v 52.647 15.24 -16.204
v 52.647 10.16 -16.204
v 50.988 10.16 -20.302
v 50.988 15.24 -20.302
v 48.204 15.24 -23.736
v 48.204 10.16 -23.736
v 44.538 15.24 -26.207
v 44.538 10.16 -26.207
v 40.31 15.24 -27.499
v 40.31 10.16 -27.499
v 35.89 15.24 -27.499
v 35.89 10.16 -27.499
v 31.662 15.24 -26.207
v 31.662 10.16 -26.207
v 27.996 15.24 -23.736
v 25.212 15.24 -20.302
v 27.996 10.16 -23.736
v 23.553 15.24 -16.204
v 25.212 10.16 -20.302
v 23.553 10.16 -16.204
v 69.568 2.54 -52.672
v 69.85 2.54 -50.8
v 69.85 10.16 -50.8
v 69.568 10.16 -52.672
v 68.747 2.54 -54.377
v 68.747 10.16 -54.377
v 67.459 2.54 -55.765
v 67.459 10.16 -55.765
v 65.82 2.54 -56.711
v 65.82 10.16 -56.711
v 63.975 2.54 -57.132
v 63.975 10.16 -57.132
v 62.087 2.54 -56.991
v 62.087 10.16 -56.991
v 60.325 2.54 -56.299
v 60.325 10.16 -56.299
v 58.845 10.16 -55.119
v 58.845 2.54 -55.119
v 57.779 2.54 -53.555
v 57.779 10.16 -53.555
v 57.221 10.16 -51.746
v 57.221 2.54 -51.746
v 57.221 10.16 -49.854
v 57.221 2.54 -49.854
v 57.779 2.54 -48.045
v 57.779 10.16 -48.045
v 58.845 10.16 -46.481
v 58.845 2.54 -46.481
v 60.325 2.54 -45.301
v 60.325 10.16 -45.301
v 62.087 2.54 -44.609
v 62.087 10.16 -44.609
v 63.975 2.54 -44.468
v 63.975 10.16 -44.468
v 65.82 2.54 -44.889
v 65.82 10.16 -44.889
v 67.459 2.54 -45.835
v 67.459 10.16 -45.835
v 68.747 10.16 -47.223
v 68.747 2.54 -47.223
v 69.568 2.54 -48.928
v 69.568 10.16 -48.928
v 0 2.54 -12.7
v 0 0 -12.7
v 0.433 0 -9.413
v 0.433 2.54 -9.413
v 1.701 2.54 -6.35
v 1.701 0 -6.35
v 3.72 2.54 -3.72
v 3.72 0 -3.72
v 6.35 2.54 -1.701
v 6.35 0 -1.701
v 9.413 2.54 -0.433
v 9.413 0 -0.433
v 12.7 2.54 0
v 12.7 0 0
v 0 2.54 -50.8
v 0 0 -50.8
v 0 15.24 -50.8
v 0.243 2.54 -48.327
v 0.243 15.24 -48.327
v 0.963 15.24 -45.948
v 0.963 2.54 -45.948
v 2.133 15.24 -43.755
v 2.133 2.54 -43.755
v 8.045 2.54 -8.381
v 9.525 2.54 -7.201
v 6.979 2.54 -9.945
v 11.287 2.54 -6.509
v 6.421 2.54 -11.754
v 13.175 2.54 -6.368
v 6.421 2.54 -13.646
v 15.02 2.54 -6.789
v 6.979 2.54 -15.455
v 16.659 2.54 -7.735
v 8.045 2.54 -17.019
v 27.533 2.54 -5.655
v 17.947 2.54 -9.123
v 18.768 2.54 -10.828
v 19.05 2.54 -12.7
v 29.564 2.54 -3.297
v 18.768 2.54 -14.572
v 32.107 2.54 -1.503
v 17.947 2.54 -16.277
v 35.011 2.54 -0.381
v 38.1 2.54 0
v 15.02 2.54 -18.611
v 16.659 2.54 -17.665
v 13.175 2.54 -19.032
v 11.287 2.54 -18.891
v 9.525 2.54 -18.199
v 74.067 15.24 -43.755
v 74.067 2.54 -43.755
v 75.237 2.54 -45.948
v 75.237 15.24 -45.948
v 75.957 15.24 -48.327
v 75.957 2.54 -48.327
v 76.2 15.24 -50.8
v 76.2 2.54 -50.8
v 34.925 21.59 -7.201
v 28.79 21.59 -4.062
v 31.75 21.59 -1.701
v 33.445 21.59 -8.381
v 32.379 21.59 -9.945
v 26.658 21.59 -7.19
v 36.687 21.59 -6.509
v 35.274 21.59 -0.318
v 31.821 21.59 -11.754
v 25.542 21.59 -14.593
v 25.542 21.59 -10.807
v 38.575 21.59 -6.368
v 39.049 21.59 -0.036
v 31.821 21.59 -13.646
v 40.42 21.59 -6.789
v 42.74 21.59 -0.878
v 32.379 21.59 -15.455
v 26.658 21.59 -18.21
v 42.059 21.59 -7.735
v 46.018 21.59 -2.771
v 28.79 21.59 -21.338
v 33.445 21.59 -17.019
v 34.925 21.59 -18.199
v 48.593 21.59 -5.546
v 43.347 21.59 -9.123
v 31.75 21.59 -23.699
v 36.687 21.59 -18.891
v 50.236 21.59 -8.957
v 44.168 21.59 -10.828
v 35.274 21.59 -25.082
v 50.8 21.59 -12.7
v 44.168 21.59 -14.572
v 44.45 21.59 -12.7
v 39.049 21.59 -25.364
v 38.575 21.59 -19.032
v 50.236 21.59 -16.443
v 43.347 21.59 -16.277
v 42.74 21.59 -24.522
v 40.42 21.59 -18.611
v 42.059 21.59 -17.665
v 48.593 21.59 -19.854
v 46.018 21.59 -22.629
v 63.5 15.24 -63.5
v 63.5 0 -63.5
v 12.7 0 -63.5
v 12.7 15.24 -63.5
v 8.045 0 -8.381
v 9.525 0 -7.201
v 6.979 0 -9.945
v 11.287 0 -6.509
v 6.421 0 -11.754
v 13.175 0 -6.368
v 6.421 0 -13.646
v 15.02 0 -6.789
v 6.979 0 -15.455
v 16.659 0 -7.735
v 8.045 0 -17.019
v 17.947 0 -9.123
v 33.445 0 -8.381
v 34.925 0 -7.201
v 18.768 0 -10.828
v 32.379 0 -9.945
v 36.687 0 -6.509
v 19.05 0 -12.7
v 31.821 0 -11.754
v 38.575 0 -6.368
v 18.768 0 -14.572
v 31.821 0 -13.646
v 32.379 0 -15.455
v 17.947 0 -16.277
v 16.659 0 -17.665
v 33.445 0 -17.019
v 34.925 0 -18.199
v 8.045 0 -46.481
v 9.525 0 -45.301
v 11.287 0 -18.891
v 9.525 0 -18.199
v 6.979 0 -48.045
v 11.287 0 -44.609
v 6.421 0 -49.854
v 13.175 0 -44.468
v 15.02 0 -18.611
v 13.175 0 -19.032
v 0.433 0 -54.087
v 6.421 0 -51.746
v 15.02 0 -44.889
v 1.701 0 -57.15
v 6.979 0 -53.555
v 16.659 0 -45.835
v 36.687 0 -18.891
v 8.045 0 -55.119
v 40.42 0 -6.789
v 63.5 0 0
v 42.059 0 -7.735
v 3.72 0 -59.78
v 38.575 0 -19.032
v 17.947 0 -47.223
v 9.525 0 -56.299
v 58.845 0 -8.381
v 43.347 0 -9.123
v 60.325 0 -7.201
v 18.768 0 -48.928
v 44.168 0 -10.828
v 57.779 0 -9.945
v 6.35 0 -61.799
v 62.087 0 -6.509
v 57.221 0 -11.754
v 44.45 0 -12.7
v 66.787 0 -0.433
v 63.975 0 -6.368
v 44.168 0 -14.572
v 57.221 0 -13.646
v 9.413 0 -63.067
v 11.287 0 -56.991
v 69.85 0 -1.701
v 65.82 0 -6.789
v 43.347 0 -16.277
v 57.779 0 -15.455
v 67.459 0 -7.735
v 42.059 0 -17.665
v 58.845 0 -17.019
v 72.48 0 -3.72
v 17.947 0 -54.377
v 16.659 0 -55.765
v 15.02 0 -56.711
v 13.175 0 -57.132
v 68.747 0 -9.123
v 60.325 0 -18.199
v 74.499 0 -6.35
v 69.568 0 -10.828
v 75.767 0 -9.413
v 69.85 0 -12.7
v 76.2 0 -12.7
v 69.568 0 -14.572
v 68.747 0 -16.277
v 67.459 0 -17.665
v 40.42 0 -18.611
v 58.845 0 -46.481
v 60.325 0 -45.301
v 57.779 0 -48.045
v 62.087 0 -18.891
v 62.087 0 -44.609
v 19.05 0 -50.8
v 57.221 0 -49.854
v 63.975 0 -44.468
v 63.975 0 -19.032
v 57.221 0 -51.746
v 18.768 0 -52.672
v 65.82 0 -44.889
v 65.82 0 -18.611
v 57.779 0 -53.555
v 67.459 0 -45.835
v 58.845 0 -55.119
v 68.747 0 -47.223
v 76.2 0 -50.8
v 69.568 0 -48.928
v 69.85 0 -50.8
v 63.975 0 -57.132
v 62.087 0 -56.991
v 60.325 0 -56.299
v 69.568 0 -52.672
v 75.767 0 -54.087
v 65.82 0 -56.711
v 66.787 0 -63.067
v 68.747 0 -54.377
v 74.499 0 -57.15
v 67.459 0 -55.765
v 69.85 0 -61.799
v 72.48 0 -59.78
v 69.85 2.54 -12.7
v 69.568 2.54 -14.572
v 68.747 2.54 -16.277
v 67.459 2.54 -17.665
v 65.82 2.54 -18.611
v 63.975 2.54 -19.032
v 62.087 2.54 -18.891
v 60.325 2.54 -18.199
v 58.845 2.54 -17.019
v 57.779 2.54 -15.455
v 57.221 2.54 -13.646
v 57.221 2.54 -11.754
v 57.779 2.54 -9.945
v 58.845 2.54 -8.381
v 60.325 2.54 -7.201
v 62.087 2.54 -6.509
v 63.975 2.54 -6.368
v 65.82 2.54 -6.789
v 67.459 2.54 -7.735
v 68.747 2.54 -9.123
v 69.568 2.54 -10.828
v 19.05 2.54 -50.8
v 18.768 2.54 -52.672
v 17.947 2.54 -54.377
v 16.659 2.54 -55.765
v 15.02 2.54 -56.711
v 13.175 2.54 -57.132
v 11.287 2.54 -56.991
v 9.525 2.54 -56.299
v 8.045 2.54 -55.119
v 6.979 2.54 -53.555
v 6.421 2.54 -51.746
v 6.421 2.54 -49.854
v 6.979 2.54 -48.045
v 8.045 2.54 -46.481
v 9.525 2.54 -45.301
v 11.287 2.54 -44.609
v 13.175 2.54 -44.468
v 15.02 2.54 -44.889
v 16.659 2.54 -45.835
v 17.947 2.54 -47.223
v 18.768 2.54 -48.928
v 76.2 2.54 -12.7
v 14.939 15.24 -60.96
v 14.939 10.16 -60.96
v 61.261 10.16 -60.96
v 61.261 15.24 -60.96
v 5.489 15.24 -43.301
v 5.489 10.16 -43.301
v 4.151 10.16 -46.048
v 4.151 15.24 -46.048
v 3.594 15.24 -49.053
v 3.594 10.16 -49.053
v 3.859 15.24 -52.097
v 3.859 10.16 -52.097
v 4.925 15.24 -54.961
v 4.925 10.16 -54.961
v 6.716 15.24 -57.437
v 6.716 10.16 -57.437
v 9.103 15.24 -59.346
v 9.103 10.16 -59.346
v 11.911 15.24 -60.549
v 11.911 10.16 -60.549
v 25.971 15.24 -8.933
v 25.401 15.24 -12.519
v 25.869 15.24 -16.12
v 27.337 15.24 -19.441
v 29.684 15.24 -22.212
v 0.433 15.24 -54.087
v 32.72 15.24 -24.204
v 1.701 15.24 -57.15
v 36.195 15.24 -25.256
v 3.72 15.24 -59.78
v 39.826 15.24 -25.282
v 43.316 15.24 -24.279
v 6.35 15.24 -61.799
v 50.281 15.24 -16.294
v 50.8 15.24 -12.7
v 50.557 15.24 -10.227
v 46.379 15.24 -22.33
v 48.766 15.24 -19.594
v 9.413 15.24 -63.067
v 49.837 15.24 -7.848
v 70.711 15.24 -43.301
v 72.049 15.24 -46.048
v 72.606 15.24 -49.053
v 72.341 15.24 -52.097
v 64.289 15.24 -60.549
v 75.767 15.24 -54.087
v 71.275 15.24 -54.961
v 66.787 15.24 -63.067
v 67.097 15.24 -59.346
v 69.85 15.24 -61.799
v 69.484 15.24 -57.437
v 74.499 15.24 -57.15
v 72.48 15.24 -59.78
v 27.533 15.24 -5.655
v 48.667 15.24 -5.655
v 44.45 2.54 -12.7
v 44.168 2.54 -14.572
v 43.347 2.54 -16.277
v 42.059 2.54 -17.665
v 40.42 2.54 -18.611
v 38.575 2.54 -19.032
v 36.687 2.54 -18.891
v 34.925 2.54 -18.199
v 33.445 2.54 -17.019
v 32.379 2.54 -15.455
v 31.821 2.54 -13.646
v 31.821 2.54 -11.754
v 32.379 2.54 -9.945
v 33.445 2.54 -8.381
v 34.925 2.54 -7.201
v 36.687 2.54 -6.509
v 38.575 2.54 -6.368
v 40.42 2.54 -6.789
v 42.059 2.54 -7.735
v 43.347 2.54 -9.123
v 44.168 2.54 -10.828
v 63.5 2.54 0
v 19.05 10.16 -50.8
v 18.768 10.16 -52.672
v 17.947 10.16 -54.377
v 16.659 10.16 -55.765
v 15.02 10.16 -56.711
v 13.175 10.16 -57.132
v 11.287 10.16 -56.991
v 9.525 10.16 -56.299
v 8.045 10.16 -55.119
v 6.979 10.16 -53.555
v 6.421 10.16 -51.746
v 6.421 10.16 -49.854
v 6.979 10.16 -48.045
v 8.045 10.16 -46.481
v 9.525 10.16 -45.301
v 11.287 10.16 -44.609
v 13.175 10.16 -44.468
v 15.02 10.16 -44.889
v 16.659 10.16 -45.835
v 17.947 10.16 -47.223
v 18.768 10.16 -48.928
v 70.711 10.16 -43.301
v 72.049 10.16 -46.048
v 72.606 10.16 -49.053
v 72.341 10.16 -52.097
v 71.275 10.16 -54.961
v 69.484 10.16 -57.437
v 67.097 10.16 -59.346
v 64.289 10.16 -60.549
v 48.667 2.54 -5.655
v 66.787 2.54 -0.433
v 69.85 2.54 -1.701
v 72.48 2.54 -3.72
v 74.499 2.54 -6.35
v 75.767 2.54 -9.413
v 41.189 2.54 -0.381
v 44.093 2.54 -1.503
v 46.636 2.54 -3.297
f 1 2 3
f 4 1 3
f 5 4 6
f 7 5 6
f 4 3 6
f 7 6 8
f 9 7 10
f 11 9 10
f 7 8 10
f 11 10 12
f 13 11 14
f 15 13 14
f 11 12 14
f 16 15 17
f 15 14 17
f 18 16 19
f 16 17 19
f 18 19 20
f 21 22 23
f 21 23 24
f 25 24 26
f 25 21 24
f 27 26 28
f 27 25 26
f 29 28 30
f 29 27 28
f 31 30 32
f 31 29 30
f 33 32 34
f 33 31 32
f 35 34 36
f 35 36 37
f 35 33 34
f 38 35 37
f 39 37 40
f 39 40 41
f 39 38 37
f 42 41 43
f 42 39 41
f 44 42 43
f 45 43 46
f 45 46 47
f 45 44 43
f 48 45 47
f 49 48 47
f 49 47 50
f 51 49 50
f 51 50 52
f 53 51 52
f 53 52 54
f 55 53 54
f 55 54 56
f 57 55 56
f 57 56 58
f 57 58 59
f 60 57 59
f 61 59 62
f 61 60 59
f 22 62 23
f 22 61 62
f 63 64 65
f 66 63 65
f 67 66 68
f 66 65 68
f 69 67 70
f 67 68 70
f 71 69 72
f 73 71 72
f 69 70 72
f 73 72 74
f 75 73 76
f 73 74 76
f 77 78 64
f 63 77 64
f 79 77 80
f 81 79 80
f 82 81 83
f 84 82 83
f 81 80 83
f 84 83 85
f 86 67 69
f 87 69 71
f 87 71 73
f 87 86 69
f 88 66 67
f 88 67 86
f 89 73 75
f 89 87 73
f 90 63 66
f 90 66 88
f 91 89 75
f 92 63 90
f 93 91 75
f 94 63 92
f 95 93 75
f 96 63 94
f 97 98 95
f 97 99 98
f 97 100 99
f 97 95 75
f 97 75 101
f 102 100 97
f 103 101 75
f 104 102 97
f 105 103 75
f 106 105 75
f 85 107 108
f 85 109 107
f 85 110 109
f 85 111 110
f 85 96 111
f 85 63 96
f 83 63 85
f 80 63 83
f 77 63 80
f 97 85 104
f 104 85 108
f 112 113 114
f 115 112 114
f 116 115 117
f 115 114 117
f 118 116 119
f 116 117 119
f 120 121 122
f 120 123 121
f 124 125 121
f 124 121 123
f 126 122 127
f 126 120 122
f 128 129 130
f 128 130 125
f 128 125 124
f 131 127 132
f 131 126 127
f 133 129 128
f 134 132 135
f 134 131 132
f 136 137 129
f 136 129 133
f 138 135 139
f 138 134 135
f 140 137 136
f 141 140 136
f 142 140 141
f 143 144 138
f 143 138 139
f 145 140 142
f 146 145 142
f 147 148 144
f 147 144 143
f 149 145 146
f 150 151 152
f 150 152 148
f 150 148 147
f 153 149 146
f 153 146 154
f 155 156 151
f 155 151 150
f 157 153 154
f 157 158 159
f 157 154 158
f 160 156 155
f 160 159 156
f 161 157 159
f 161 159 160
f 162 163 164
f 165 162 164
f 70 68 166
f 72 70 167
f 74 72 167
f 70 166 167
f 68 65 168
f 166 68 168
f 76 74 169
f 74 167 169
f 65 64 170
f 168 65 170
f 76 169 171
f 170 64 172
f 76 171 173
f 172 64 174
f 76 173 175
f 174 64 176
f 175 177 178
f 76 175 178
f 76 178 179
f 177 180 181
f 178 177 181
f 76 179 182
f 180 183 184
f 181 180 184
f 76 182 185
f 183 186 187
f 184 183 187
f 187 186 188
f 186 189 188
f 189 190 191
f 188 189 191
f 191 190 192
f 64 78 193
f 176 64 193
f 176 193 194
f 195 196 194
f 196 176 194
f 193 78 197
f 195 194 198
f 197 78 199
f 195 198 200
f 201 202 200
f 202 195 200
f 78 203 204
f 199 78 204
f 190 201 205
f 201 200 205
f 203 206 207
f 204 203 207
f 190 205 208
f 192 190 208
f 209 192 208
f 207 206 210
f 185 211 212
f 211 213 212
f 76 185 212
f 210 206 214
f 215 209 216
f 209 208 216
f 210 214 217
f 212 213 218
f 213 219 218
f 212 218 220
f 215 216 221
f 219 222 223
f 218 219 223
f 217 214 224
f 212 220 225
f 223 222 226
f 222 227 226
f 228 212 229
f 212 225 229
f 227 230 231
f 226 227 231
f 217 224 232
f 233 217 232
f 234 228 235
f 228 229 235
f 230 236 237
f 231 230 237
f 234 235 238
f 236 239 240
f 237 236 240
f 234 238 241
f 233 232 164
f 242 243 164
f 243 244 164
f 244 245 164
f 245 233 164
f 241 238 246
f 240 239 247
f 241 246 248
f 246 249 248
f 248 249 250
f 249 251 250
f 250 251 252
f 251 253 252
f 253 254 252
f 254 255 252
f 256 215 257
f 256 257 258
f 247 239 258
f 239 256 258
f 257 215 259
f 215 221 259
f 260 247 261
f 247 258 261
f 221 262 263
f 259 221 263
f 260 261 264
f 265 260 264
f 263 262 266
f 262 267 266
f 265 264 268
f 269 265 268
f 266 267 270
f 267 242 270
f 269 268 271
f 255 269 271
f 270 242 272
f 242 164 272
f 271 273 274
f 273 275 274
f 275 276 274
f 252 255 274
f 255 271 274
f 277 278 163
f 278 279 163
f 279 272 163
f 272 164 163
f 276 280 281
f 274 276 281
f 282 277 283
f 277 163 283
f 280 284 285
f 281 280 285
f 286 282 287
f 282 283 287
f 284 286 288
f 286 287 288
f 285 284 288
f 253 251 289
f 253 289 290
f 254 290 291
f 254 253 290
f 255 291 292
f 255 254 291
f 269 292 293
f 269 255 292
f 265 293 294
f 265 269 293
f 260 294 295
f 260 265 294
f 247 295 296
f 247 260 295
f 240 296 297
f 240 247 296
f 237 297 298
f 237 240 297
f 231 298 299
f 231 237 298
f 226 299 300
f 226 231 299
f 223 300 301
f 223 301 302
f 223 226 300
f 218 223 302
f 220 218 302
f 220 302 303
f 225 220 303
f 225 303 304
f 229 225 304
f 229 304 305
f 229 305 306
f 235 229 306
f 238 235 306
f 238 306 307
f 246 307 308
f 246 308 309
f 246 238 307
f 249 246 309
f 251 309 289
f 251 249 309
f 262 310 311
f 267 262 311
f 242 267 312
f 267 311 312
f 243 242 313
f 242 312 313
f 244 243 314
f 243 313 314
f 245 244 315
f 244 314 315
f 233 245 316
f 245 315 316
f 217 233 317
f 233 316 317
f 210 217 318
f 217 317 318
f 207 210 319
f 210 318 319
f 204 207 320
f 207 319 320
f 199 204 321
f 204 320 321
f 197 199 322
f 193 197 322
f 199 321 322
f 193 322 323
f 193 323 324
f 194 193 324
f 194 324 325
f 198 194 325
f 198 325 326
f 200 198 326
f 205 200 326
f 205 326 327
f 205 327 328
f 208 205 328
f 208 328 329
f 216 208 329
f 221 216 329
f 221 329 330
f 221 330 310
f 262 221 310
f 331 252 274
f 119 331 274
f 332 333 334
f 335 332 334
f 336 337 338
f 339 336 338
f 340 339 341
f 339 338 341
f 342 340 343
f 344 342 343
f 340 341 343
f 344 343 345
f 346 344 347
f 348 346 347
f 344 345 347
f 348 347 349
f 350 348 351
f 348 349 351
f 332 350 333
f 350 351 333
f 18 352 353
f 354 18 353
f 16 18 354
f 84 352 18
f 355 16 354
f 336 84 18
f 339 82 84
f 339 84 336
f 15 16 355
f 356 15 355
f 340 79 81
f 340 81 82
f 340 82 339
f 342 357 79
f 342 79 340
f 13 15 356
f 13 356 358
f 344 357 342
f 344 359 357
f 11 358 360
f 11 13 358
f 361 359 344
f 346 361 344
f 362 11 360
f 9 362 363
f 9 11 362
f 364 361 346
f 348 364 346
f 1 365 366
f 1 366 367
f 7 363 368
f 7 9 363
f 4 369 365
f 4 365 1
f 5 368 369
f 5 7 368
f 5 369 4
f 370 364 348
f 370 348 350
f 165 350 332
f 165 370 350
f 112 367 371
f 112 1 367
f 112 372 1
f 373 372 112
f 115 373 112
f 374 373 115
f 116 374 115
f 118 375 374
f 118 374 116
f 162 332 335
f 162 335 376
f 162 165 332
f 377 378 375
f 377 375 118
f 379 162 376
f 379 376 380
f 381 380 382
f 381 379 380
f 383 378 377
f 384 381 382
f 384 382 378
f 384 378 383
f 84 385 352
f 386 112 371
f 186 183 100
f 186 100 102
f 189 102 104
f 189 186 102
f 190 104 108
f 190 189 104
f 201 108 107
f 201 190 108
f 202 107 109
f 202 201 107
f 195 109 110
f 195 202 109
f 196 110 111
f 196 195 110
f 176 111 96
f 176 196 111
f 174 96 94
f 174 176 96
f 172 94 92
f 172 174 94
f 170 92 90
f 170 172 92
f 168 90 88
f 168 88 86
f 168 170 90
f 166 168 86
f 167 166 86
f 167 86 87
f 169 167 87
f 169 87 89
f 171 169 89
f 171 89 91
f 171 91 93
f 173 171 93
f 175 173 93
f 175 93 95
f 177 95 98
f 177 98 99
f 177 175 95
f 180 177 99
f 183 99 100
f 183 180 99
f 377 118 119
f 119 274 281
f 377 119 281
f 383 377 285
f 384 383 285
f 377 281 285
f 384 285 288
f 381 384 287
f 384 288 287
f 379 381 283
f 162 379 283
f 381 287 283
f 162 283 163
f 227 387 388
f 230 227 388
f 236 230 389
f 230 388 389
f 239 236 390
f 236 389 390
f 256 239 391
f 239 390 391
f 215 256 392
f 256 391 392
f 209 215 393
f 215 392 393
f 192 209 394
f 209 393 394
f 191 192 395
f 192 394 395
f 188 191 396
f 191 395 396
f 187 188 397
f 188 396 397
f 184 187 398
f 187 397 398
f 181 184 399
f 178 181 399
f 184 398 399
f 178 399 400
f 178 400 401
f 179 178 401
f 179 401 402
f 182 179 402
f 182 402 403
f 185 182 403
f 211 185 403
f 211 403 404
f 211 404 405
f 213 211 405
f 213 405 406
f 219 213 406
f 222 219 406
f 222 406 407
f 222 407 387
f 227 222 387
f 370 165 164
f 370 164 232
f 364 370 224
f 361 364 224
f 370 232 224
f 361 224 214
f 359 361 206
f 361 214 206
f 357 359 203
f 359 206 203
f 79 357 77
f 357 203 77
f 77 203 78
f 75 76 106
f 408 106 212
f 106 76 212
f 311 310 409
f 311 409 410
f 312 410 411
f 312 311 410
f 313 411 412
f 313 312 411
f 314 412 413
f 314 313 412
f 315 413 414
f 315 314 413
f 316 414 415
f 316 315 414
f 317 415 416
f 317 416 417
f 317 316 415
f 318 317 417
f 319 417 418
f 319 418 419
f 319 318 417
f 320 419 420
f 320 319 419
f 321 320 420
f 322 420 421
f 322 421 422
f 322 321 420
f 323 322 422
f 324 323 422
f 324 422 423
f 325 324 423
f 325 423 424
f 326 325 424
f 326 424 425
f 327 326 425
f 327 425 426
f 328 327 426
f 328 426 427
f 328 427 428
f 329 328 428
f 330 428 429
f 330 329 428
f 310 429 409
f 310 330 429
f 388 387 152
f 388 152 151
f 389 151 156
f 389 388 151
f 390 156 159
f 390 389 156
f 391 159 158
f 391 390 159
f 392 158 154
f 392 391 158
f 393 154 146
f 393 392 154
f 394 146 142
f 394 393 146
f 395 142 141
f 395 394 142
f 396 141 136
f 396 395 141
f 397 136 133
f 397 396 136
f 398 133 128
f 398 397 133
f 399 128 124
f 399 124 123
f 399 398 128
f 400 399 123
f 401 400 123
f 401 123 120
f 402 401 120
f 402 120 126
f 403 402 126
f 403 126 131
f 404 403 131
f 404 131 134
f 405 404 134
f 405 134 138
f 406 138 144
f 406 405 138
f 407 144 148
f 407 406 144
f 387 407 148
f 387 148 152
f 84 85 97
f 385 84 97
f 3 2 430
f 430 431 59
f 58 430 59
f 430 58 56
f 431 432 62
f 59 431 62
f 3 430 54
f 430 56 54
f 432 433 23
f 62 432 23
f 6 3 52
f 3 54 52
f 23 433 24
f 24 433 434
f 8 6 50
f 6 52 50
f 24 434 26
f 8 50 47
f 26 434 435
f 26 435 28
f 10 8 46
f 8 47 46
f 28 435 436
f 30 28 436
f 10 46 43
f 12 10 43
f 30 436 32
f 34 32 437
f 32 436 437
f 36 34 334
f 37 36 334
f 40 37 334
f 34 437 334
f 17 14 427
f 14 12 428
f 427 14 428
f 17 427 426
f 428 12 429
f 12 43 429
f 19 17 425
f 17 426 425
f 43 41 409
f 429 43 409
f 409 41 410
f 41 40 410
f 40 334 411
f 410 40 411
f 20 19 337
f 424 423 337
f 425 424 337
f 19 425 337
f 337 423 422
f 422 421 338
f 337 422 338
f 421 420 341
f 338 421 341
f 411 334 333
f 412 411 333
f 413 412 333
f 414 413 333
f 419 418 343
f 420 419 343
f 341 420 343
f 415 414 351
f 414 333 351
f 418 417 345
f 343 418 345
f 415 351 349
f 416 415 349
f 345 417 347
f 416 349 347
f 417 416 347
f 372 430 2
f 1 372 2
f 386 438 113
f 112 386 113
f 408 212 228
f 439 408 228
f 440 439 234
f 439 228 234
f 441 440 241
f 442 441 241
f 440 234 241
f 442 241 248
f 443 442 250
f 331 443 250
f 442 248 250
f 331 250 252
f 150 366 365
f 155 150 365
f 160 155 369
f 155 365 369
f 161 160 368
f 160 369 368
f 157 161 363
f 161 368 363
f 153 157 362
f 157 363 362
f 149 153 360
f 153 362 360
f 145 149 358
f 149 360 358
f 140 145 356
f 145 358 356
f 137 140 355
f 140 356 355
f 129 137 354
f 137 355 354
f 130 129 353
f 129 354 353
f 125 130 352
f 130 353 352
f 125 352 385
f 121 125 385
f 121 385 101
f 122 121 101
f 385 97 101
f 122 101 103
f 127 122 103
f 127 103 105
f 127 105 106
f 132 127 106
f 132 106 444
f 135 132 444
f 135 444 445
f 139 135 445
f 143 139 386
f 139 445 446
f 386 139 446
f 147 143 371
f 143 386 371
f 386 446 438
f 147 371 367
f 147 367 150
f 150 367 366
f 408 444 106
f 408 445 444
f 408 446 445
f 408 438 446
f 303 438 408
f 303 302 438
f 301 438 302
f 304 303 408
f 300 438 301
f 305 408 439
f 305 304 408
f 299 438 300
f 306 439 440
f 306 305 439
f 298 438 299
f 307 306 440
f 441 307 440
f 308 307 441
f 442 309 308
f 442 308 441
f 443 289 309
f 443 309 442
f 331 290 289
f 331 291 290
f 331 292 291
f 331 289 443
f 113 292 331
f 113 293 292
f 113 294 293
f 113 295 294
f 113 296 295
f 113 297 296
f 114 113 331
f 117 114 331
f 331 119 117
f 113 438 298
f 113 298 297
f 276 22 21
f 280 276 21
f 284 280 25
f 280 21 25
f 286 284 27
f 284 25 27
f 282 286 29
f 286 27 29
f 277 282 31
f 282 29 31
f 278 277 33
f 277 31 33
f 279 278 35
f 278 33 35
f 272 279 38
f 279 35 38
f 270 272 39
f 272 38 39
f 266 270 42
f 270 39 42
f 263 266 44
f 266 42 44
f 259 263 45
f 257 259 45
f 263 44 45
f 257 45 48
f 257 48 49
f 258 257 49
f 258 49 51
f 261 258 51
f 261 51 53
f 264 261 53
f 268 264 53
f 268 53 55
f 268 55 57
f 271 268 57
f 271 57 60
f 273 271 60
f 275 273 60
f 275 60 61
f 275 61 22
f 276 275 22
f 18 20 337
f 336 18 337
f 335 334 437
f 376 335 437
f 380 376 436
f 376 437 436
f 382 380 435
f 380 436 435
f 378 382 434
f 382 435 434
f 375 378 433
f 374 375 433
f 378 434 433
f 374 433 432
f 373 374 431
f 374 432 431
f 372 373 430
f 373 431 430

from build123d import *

# Parameters (mm, degrees)
SKETCH1_R           = 6.35
BOSS_EXTRUDE1_DEPTH = 2.54
BOSS_EXTRUDE2_DEPTH = 12.7
SKETCH2_3_R         = 6.35
BOSS_EXTRUDE3_DEPTH = 19.05
SKETCH2_5_R         = 6.35
BOSS_EXTRUDE4_DEPTH = 7.62
CUT_EXTRUDE1_START  = -7.62
SKETCH5_R           = 6.35
CUT_EXTRUDE1_DEPTH  = 7.62


with BuildPart() as part:
    # Sketch1 → Boss-Extrude1 (new body)
    with BuildSketch(Plane(origin=(0, 0, 0), x_dir=(1, 0, 0), z_dir=(0, 1, 0))):
        with BuildLine():
            Line((12.7, 0), (63.5, 0))
            ThreePointArc((63.5, 0), (72.480256121, 3.719743879), (76.2, 12.7))
            Line((76.2, 12.7), (76.2, 50.8))
            ThreePointArc((76.2, 50.8), (72.480256121, 59.780256121), (63.5, 63.5))
            Line((63.5, 63.5), (12.7, 63.5))
            ThreePointArc((12.7, 63.5), (3.719743879, 59.780256121), (0, 50.8))
            Line((0, 50.8), (0, 12.7))
            ThreePointArc((0, 12.7), (3.719743879, 3.719743879), (12.7, 0))
        make_face()
        with Locations((12.7, 12.7)):
            Circle(SKETCH1_R, mode=Mode.SUBTRACT)
        with Locations((63.5, 12.7)):
            Circle(SKETCH1_R, mode=Mode.SUBTRACT)
    extrude(amount=BOSS_EXTRUDE1_DEPTH)

    # Sketch2 → Boss-Extrude2 (add)
    with BuildSketch(Plane(origin=(0, 2.54, 0), x_dir=(1, 0, 0), z_dir=(0, 1, 0))):
        with BuildLine():
            Line((63.5, 63.5), (12.7, 63.5))
            ThreePointArc((12.7, 63.5), (3.719743879, 59.780256121), (0, 50.8))
            ThreePointArc((0, 50.8), (0.544931264, 47.119741312), (2.132961262, 43.755307508))
            Line((2.132961262, 43.755307508), (27.532961262, 5.655307508))
            ThreePointArc((27.532961262, 5.655307508), (34.419741312, 24.855068736), (50.8, 12.7))
            ThreePointArc((50.8, 12.7), (50.255068736, 9.019741312), (48.667038738, 5.655307508))
            Line((48.667038738, 5.655307508), (74.067038738, 43.755307508))
            ThreePointArc((74.067038738, 43.755307508), (75.655068736, 47.119741312), (76.2, 50.8))
            ThreePointArc((76.2, 50.8), (72.480256121, 59.780256121), (63.5, 63.5))
        make_face()
        with BuildLine():
            Line((23.553103988, 16.204143539), (5.488594295, 43.300908078))
            ThreePointArc((5.488594295, 43.300908078), (4.924935684, 54.961088143), (14.939453481, 60.96))
            Line((14.939453481, 60.96), (61.260546519, 60.96))
            ThreePointArc((61.260546519, 60.96), (71.275064316, 54.961088143), (70.711405705, 43.300908078))
            Line((70.711405705, 43.300908078), (52.646896012, 16.204143539))
            ThreePointArc((52.646896012, 16.204143539), (38.1, 27.662994537), (23.553103988, 16.204143539))
        make_face(mode=Mode.SUBTRACT)
    extrude(amount=BOSS_EXTRUDE2_DEPTH)

    # Sketch2<3> → Boss-Extrude3 (add)
    with BuildSketch(Plane(origin=(0, 2.54, 0), x_dir=(1, 0, 0), z_dir=(0, 1, 0))):
        with BuildLine():
            ThreePointArc((50.8, 12.7), (34.419741312, 24.855068736), (27.532961262, 5.655307508))
            ThreePointArc((27.532961262, 5.655307508), (38.1, 0), (48.667038738, 5.655307508))
            ThreePointArc((48.667038738, 5.655307508), (50.255068736, 9.019741312), (50.8, 12.7))
        make_face()
        with Locations((38.1, 12.7)):
            Circle(SKETCH2_3_R, mode=Mode.SUBTRACT)
    extrude(amount=BOSS_EXTRUDE3_DEPTH)

    # Sketch2<5> → Boss-Extrude4 (add)
    with BuildSketch(Plane(origin=(0, 2.54, 0), x_dir=(1, 0, 0), z_dir=(0, 1, 0))):
        with BuildLine():
            ThreePointArc((14.939453481, 60.96), (4.924935684, 54.961088143), (5.488594295, 43.300908078))
            Line((5.488594295, 43.300908078), (23.553103988, 16.204143539))
            ThreePointArc((23.553103988, 16.204143539), (38.1, 27.662994537), (52.646896012, 16.204143539))
            Line((52.646896012, 16.204143539), (70.711405705, 43.300908078))
            ThreePointArc((70.711405705, 43.300908078), (71.275064316, 54.961088143), (61.260546519, 60.96))
            Line((61.260546519, 60.96), (14.939453481, 60.96))
        make_face()
        with Locations((12.7, 50.8)):
            Circle(SKETCH2_5_R, mode=Mode.SUBTRACT)
        with Locations((63.5, 50.8)):
            Circle(SKETCH2_5_R, mode=Mode.SUBTRACT)
    extrude(amount=BOSS_EXTRUDE4_DEPTH)

    # Sketch5 → Cut-Extrude1 (cut)
    with BuildSketch(Plane(origin=(0, 2.54, 0), x_dir=(1, 0, 0), z_dir=(0, 1, 0)).offset(CUT_EXTRUDE1_START)):
        with Locations((12.7, 50.8)):
            Circle(SKETCH5_R)
        with Locations((63.5, 50.8)):
            Circle(SKETCH5_R)
        with Locations((38.1, 12.7)):
            Circle(SKETCH5_R)
    extrude(amount=CUT_EXTRUDE1_DEPTH, mode=Mode.SUBTRACT)


solid = part.part
